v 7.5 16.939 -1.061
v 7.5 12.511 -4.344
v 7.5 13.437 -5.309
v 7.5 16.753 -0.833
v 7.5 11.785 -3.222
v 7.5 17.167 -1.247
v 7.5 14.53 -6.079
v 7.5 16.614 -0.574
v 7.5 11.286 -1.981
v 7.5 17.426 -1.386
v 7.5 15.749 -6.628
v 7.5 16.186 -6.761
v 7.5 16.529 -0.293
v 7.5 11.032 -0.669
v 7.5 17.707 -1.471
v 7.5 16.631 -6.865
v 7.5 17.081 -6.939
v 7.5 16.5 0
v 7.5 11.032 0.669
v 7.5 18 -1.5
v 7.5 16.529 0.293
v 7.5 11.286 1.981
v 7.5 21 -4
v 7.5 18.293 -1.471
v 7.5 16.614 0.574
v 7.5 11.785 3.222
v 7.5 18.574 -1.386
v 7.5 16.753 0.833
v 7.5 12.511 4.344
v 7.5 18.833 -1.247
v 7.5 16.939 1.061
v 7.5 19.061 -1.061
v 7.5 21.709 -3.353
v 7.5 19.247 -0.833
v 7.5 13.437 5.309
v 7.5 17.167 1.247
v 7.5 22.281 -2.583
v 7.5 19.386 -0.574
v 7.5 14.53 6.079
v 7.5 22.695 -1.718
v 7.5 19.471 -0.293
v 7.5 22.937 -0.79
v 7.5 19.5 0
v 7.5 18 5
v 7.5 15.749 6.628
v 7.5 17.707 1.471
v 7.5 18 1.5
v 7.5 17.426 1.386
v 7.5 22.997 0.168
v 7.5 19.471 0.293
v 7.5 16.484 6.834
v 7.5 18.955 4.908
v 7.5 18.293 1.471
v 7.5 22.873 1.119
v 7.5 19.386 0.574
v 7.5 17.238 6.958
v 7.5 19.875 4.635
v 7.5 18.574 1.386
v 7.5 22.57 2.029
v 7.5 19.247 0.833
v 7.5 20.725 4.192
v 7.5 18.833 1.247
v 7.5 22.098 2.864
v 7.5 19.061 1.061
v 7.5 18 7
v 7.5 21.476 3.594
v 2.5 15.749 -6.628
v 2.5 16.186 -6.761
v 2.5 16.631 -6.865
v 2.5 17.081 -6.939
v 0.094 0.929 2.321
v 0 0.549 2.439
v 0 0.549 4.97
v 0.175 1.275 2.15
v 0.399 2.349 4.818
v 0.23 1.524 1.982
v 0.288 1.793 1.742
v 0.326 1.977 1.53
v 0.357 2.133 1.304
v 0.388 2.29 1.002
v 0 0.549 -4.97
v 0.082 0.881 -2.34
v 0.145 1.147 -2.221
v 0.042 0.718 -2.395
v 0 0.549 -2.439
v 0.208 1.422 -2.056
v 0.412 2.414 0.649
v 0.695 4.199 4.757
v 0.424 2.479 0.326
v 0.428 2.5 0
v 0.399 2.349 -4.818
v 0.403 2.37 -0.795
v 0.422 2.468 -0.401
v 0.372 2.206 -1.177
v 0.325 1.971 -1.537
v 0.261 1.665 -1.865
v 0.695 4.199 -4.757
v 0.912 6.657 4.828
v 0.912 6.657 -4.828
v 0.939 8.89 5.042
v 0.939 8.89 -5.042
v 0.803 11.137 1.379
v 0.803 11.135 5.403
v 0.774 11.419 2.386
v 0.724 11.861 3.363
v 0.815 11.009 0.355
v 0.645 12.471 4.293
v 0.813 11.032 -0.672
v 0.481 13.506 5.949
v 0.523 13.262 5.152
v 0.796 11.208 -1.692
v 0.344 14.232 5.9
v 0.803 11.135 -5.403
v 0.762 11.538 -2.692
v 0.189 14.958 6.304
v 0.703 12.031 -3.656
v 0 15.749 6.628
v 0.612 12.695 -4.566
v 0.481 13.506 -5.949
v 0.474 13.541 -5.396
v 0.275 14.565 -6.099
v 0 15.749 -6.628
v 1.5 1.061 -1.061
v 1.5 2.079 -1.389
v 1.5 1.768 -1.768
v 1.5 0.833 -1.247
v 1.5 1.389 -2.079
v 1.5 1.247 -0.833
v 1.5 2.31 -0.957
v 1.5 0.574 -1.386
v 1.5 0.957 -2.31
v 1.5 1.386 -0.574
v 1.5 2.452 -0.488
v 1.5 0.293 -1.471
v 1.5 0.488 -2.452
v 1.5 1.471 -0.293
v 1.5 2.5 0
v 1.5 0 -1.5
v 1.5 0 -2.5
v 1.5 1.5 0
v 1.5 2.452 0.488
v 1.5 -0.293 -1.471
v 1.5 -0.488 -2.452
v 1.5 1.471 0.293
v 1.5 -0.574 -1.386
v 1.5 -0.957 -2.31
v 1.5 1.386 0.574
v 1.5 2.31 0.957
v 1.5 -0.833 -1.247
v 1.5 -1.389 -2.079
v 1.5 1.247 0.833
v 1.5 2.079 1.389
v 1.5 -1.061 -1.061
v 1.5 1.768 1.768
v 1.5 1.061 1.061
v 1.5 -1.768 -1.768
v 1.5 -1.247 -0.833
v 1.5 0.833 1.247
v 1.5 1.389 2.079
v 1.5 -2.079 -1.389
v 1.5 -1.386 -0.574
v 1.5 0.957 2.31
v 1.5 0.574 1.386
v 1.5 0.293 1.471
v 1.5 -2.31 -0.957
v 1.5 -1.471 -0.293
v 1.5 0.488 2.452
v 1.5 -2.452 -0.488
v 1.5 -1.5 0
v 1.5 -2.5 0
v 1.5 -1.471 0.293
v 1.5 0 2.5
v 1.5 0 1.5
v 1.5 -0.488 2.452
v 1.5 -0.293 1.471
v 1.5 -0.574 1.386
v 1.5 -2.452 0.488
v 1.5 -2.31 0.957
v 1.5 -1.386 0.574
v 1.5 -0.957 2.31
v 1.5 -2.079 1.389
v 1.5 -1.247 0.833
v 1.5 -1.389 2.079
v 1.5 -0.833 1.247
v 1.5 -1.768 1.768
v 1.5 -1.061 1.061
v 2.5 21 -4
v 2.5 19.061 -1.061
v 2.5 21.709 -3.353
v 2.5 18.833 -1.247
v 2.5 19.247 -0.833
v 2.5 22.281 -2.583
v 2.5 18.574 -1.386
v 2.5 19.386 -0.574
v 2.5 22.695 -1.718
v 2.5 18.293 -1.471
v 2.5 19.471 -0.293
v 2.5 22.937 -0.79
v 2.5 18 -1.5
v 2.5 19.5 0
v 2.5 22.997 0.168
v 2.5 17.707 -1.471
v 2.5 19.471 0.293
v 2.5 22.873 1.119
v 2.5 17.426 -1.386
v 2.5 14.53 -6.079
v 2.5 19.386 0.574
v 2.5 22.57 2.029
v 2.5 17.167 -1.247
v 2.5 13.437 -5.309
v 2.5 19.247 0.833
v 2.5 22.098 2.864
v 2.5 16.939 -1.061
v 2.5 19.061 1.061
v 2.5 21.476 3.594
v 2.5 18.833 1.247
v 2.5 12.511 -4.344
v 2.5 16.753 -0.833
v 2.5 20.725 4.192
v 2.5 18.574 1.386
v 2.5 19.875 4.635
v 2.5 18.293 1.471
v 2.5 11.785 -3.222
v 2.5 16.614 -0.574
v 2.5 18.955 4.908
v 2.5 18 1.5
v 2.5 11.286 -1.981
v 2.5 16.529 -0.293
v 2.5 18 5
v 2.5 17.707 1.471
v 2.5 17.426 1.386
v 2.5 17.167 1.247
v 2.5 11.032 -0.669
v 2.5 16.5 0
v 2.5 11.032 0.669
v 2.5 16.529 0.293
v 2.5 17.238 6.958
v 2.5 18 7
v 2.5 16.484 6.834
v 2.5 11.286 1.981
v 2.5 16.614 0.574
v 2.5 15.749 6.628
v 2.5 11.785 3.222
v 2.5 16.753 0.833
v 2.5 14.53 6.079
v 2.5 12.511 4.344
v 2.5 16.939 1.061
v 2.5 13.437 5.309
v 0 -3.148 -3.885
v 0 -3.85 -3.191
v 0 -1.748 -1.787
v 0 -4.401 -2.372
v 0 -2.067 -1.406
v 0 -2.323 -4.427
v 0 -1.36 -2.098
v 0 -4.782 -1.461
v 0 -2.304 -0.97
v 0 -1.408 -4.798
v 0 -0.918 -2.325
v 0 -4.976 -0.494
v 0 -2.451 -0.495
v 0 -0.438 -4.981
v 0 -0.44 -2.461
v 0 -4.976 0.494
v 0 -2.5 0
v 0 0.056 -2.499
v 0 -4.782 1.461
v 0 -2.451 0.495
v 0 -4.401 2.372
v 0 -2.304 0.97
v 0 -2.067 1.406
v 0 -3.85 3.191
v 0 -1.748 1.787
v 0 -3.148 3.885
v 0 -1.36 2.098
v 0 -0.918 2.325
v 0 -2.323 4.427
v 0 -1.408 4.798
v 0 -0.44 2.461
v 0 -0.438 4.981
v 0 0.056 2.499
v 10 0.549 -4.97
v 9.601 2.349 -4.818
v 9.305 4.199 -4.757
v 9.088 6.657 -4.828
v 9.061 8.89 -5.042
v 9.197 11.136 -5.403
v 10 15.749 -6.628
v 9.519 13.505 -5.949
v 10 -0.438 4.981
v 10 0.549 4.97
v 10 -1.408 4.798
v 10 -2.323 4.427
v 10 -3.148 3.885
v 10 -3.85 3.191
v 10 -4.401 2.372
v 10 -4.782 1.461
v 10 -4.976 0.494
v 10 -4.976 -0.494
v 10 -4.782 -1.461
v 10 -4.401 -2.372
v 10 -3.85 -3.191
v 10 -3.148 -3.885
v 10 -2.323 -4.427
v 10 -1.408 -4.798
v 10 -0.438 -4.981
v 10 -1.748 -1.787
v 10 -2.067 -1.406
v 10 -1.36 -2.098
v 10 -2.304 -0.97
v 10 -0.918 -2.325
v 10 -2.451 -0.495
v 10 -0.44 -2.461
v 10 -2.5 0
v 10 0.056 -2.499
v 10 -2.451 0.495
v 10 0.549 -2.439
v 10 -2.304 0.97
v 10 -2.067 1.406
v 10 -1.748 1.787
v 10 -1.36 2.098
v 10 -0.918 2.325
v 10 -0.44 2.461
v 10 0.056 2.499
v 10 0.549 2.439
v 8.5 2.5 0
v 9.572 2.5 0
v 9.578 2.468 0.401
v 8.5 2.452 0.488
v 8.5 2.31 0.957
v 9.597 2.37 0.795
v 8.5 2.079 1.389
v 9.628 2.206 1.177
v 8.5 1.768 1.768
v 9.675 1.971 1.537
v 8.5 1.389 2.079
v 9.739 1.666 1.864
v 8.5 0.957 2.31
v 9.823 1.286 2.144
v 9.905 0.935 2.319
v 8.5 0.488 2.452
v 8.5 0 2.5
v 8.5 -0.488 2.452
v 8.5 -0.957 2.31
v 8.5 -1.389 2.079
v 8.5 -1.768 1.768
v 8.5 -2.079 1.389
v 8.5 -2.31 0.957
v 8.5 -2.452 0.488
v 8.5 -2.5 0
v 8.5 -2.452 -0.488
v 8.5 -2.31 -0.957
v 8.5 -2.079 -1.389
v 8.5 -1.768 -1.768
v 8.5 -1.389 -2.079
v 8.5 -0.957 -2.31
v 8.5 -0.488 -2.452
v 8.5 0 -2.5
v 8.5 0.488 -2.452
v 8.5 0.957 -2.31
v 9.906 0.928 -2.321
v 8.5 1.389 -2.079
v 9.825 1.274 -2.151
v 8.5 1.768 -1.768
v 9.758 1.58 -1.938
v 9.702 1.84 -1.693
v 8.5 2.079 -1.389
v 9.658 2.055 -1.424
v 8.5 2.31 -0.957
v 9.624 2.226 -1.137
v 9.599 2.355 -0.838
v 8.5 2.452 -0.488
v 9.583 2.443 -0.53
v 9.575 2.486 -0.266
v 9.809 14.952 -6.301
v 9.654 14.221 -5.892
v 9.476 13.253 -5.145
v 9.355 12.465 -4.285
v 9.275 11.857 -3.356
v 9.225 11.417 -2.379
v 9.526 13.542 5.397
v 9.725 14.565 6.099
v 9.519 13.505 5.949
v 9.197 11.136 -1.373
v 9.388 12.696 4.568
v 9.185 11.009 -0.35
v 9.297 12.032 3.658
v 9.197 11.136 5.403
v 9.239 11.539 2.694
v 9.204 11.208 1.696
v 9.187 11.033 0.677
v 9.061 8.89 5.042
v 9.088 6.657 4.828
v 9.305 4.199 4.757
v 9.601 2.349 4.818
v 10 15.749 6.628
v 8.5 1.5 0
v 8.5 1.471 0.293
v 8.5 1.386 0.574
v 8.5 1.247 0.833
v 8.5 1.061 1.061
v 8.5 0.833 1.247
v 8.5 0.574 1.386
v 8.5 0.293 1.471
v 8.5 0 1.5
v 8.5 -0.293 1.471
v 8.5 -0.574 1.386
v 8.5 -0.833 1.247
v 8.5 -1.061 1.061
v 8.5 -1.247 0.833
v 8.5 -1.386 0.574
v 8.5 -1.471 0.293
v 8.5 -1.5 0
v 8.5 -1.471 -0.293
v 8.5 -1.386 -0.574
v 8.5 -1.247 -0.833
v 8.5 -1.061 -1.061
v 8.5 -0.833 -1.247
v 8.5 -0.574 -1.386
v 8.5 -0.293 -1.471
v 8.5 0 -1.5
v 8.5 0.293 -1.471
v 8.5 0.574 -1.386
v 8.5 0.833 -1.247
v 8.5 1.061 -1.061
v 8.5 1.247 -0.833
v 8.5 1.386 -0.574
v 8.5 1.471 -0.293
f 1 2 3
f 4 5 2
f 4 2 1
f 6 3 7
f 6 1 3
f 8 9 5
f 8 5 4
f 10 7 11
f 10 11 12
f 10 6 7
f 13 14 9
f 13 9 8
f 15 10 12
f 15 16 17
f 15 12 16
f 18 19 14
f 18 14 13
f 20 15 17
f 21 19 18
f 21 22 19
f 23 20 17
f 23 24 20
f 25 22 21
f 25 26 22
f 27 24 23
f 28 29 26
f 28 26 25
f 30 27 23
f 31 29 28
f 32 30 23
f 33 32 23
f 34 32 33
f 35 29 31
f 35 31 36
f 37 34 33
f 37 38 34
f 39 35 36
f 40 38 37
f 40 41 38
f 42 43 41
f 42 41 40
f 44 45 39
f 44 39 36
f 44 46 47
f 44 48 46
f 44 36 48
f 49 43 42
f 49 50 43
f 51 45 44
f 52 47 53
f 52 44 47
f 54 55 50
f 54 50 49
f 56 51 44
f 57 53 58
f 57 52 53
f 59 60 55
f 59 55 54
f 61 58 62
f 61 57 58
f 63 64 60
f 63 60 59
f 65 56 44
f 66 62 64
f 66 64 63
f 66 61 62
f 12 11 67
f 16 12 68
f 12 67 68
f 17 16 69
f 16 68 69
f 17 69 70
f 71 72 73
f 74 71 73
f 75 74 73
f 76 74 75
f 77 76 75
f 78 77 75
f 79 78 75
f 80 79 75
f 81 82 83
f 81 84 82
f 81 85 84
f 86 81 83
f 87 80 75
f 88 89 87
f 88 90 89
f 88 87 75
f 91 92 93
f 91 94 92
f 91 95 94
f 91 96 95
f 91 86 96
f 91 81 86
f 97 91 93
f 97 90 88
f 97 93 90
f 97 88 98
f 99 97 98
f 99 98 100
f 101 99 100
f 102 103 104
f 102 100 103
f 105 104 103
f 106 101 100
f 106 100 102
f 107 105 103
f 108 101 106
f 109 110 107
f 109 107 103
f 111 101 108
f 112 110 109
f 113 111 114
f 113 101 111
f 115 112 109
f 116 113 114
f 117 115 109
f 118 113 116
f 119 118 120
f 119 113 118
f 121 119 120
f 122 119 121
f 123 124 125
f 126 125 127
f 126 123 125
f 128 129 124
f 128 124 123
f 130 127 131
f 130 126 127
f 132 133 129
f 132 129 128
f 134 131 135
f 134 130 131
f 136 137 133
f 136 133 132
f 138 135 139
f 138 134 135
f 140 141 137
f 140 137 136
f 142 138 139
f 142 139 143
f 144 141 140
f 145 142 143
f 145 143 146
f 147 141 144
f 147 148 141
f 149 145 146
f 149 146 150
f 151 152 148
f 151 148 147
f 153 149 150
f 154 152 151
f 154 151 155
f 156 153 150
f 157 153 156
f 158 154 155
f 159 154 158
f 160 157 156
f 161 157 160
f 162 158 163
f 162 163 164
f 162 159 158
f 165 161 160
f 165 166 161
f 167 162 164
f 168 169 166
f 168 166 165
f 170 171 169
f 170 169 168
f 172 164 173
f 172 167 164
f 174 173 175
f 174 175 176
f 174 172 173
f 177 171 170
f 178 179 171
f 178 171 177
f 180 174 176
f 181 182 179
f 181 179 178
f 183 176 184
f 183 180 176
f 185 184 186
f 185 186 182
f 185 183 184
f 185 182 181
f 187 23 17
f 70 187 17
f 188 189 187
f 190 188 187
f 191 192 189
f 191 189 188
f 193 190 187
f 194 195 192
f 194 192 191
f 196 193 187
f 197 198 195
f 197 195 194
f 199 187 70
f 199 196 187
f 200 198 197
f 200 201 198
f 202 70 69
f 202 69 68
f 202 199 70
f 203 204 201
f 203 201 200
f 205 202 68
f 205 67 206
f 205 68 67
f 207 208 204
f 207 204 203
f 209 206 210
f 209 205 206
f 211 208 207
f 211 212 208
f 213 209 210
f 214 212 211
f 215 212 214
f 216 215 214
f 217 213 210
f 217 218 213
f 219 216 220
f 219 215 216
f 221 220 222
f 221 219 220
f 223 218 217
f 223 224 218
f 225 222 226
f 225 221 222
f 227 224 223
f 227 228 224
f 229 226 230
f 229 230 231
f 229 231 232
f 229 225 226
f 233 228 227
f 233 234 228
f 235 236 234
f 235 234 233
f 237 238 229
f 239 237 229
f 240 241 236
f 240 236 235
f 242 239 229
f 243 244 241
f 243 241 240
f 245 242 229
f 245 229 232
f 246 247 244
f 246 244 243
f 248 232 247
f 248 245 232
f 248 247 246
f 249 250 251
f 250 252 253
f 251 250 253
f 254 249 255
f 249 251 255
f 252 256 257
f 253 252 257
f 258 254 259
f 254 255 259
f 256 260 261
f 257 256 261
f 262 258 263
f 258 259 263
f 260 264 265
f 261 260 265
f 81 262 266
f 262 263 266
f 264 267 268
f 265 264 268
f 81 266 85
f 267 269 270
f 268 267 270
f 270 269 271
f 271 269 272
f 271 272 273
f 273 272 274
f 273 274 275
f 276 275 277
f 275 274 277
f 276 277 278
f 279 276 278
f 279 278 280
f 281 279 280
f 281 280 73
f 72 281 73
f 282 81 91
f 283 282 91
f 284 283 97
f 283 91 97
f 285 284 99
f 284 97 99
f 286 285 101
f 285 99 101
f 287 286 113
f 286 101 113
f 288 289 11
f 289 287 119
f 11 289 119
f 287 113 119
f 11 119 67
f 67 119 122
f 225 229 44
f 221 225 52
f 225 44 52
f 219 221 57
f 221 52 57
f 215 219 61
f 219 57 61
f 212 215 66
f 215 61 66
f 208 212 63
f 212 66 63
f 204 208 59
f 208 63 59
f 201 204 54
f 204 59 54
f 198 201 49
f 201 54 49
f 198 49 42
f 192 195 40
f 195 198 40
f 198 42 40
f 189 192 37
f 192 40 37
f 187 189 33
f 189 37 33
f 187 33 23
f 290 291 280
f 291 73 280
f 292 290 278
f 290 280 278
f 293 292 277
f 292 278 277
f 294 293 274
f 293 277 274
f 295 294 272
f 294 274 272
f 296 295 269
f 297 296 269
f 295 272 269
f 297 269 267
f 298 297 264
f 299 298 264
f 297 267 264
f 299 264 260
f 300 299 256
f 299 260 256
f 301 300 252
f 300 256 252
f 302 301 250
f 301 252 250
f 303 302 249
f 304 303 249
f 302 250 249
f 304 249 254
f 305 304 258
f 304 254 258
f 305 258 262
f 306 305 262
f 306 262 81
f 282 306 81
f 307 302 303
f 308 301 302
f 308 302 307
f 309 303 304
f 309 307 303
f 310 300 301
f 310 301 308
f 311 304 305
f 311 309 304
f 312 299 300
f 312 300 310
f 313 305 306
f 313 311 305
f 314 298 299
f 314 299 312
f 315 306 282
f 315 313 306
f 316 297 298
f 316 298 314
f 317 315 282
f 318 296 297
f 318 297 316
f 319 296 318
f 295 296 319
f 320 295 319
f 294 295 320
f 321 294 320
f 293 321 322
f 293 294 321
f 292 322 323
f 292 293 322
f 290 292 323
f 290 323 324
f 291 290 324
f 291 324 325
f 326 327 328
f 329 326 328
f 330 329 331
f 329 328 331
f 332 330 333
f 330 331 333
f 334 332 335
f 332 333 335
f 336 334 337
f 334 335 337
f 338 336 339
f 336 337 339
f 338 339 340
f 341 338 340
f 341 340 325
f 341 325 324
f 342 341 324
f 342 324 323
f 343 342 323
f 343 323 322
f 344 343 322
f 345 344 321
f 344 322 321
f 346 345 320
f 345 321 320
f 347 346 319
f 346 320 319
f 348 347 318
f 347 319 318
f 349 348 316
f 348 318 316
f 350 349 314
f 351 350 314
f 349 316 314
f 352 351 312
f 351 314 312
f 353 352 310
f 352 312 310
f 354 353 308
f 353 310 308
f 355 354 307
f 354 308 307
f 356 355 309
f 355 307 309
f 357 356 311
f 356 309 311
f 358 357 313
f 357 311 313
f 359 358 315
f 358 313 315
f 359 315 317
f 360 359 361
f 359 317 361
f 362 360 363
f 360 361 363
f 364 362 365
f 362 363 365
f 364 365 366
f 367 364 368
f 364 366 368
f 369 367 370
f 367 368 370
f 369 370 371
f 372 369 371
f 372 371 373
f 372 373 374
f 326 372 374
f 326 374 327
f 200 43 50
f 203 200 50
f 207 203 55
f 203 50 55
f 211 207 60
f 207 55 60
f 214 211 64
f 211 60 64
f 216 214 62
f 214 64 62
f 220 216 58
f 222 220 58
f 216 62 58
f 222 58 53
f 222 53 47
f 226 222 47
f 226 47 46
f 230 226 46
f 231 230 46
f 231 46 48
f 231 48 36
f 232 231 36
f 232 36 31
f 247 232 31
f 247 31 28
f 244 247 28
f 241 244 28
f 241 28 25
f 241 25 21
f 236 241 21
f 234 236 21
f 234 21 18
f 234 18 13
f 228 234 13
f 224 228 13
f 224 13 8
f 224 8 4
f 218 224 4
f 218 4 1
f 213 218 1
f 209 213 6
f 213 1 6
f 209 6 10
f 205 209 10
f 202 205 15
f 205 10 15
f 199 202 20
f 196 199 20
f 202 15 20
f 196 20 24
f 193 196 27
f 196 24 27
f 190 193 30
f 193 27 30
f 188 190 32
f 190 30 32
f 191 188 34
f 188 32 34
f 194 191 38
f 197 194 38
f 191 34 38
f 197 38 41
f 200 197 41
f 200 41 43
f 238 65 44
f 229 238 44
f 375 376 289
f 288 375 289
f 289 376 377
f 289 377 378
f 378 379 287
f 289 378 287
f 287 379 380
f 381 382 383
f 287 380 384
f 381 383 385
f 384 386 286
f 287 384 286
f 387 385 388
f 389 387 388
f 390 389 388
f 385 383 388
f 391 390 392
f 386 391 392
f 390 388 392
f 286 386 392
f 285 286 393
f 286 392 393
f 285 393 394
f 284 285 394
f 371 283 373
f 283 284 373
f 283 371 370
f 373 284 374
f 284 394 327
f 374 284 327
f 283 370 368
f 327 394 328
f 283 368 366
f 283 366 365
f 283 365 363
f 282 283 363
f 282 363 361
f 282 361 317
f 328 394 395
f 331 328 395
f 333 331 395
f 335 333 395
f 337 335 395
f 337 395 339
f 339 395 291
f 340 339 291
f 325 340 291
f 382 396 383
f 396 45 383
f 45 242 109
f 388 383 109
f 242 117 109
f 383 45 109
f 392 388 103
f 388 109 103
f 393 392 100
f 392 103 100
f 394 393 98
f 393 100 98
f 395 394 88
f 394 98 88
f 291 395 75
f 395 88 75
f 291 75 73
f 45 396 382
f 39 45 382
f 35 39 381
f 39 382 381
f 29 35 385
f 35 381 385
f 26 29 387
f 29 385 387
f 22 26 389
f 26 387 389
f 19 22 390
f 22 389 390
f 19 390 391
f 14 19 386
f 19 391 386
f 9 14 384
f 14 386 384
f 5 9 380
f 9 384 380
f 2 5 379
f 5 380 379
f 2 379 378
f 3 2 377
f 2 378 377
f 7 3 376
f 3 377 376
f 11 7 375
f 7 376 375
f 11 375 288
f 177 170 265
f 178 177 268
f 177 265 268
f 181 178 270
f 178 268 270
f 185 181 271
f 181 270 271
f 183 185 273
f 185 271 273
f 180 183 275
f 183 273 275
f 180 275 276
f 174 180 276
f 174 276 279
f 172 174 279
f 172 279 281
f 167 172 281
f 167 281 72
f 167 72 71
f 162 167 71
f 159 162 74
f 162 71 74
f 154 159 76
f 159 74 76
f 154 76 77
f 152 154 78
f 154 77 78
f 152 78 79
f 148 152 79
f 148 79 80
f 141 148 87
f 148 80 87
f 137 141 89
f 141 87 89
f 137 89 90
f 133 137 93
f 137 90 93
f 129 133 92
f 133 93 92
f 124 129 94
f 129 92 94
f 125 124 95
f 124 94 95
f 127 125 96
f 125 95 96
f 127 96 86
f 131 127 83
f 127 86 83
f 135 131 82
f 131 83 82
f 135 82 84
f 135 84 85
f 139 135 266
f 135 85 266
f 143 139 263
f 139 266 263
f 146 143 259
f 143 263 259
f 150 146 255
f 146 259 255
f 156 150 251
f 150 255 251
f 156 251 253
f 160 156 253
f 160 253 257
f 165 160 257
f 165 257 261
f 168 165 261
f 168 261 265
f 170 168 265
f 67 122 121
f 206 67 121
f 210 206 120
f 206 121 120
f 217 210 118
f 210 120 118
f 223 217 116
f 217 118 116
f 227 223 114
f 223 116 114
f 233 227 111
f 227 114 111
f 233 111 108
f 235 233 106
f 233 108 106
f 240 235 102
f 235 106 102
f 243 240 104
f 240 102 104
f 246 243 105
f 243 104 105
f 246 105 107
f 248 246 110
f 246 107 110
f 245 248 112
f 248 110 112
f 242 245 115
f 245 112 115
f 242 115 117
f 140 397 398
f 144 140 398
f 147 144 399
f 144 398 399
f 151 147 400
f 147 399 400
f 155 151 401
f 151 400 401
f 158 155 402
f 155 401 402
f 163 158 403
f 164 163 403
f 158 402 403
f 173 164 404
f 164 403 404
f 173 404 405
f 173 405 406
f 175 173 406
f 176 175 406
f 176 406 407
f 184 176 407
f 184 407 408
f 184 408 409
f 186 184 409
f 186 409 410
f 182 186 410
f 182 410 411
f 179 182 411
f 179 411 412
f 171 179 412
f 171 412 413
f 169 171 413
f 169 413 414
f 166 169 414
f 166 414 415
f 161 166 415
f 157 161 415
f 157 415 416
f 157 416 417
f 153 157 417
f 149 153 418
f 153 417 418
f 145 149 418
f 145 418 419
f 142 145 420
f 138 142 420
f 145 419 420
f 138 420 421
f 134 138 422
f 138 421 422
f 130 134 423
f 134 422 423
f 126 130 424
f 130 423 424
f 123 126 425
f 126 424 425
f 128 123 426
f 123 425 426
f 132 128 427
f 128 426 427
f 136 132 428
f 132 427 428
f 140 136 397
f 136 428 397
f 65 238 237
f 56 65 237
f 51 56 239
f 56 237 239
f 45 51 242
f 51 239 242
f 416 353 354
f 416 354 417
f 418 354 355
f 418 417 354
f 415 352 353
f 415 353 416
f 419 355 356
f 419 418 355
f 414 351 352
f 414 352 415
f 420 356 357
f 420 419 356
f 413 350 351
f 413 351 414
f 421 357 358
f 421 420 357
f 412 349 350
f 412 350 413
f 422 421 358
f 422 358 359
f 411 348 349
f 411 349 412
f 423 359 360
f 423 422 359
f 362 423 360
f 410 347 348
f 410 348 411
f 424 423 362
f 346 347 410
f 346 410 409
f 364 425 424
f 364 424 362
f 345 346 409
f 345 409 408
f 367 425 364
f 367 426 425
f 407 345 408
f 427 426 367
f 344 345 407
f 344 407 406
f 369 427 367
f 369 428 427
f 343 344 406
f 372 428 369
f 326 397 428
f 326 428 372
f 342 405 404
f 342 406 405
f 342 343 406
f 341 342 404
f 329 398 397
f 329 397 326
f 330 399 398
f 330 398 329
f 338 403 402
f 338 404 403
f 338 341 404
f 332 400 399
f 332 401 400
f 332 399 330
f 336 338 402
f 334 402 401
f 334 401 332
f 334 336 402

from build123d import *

# Parameters (mm, degrees)
F1_DEPTH  = 2.5
F3_DEPTH  = 5
F5_DEPTH  = 2.5
F6_R      = 7
F7_DEPTH  = 2.5
F8_R      = 7
F9_DEPTH  = 2.5
F11_DEPTH = 7.501
F12_R     = 1.5
F13_DEPTH = 10.001
F14_R     = 2.5
F15_DEPTH = 1.5
F16_R     = 2.5
F17_DEPTH = 1.5
F18_R     = 30.9477503488
F19_DEPTH = 12.5


with BuildPart() as f1:
    # F0 (on Right) → F1 (new body)
    with BuildSketch(Plane.YZ):
        with BuildLine():
            ThreePointArc((15.7492691828, 6.6282886772), (8.2400840273, 4.9647449332), (0.54884134, 4.96978603))
            ThreePointArc((0.54884134, 4.96978603), (-5, 0), (0.54884134, -4.96978603))
            ThreePointArc((0.54884134, -4.96978603), (8.2400840273, -4.9647449332), (15.7492691828, -6.6282886772))
            ThreePointArc((15.7492691828, -6.6282886772), (25, 0), (15.7492691828, 6.6282886772))
        make_face()
    extrude(amount=F1_DEPTH)

    # F2 (on face) → F3 (join)
    with BuildSketch(Plane.YZ.offset(2.5)):
        with BuildLine():
            ThreePointArc((15.7492691828, 6.6282886772), (8.2400840273, 4.9647449332), (0.54884134, 4.96978603))
            ThreePointArc((0.54884134, 4.96978603), (-5, 0), (0.54884134, -4.96978603))
            ThreePointArc((0.54884134, -4.96978603), (8.2400840273, -4.9647449332), (15.7492691828, -6.6282886772))
            ThreePointArc((15.7492691828, -6.6282886772), (25, 0), (15.7492691828, 6.6282886772))
        make_face()
    extrude(amount=F3_DEPTH)

    # F4 (on face) → F5 (join)
    with BuildSketch(Plane.YZ.offset(7.5)):
        with BuildLine():
            ThreePointArc((15.7492691828, 6.6282886772), (8.2400840273, 4.9647449332), (0.54884134, 4.96978603))
            ThreePointArc((0.54884134, 4.96978603), (-5, 0), (0.54884134, -4.96978603))
            ThreePointArc((0.54884134, -4.96978603), (8.2400840273, -4.9647449332), (15.7492691828, -6.6282886772))
            ThreePointArc((15.7492691828, -6.6282886772), (21.0150139959, -6.3174117013), (24.5686792392, -2.4191843774))
            ThreePointArc((24.5686792392, -2.4191843774), (23.0125205049, 4.8861680474), (15.7492691828, 6.6282886772))
        make_face()
    extrude(amount=F5_DEPTH)

    # F6 (on face) → F7 (cut)
    with BuildSketch(Plane.YZ.offset(10)):
        with Locations((18, 0)):
            Circle(F6_R)
    extrude(amount=-F7_DEPTH, mode=Mode.SUBTRACT)

    # F8 (on face) → F9 (cut)
    with BuildSketch(Plane(origin=(0, 0, 0), x_dir=(0, -1, 0), z_dir=(-1, 0, 0))):
        with Locations((-18, 0)):
            Circle(F8_R)
    extrude(amount=-F9_DEPTH, mode=Mode.SUBTRACT)

    # F10 (on face) → F11 (cut, through all)
    with BuildSketch(Plane.YZ.offset(7.5)):
        with BuildLine():
            ThreePointArc((18, 5), (22.7434164903, 1.5811388301), (21, -4))
            Line((21, -4), (17.0808164115, -6.9393876913))
            ThreePointArc((17.0808164115, -6.9393876913), (24.9848304861, -0.4605899264), (18, 7))
            Line((18, 7), (18, 5))
        make_face()
    extrude(amount=-F11_DEPTH, mode=Mode.SUBTRACT)

    # F12 (on face) → F13 (cut, through all)
    with BuildSketch(Plane.YZ.offset(10)):
        Circle(F12_R)
        with Locations((18, 0)):
            Circle(F12_R)
    extrude(amount=-F13_DEPTH, mode=Mode.SUBTRACT)

    # F14 (on face) → F15 (cut)
    with BuildSketch(Plane.YZ.offset(10)):
        Circle(F14_R)
    extrude(amount=-F15_DEPTH, mode=Mode.SUBTRACT)

    # F16 (on face) → F17 (cut)
    with BuildSketch(Plane(origin=(0, 0, 0), x_dir=(0, -1, 0), z_dir=(-1, 0, 0))):
        Circle(F16_R)
    extrude(amount=-F17_DEPTH, mode=Mode.SUBTRACT)

    # F18 (on Top) → F19 (cut, symmetric)
    with BuildSketch(Plane.XY):
        with Locations((-30, 8.1490552614)):
            Circle(F18_R)
        with Locations((40, 8.1490552614)):
            Circle(F18_R)
    extrude(amount=F19_DEPTH, both=True, mode=Mode.SUBTRACT)


solid = f1.part
